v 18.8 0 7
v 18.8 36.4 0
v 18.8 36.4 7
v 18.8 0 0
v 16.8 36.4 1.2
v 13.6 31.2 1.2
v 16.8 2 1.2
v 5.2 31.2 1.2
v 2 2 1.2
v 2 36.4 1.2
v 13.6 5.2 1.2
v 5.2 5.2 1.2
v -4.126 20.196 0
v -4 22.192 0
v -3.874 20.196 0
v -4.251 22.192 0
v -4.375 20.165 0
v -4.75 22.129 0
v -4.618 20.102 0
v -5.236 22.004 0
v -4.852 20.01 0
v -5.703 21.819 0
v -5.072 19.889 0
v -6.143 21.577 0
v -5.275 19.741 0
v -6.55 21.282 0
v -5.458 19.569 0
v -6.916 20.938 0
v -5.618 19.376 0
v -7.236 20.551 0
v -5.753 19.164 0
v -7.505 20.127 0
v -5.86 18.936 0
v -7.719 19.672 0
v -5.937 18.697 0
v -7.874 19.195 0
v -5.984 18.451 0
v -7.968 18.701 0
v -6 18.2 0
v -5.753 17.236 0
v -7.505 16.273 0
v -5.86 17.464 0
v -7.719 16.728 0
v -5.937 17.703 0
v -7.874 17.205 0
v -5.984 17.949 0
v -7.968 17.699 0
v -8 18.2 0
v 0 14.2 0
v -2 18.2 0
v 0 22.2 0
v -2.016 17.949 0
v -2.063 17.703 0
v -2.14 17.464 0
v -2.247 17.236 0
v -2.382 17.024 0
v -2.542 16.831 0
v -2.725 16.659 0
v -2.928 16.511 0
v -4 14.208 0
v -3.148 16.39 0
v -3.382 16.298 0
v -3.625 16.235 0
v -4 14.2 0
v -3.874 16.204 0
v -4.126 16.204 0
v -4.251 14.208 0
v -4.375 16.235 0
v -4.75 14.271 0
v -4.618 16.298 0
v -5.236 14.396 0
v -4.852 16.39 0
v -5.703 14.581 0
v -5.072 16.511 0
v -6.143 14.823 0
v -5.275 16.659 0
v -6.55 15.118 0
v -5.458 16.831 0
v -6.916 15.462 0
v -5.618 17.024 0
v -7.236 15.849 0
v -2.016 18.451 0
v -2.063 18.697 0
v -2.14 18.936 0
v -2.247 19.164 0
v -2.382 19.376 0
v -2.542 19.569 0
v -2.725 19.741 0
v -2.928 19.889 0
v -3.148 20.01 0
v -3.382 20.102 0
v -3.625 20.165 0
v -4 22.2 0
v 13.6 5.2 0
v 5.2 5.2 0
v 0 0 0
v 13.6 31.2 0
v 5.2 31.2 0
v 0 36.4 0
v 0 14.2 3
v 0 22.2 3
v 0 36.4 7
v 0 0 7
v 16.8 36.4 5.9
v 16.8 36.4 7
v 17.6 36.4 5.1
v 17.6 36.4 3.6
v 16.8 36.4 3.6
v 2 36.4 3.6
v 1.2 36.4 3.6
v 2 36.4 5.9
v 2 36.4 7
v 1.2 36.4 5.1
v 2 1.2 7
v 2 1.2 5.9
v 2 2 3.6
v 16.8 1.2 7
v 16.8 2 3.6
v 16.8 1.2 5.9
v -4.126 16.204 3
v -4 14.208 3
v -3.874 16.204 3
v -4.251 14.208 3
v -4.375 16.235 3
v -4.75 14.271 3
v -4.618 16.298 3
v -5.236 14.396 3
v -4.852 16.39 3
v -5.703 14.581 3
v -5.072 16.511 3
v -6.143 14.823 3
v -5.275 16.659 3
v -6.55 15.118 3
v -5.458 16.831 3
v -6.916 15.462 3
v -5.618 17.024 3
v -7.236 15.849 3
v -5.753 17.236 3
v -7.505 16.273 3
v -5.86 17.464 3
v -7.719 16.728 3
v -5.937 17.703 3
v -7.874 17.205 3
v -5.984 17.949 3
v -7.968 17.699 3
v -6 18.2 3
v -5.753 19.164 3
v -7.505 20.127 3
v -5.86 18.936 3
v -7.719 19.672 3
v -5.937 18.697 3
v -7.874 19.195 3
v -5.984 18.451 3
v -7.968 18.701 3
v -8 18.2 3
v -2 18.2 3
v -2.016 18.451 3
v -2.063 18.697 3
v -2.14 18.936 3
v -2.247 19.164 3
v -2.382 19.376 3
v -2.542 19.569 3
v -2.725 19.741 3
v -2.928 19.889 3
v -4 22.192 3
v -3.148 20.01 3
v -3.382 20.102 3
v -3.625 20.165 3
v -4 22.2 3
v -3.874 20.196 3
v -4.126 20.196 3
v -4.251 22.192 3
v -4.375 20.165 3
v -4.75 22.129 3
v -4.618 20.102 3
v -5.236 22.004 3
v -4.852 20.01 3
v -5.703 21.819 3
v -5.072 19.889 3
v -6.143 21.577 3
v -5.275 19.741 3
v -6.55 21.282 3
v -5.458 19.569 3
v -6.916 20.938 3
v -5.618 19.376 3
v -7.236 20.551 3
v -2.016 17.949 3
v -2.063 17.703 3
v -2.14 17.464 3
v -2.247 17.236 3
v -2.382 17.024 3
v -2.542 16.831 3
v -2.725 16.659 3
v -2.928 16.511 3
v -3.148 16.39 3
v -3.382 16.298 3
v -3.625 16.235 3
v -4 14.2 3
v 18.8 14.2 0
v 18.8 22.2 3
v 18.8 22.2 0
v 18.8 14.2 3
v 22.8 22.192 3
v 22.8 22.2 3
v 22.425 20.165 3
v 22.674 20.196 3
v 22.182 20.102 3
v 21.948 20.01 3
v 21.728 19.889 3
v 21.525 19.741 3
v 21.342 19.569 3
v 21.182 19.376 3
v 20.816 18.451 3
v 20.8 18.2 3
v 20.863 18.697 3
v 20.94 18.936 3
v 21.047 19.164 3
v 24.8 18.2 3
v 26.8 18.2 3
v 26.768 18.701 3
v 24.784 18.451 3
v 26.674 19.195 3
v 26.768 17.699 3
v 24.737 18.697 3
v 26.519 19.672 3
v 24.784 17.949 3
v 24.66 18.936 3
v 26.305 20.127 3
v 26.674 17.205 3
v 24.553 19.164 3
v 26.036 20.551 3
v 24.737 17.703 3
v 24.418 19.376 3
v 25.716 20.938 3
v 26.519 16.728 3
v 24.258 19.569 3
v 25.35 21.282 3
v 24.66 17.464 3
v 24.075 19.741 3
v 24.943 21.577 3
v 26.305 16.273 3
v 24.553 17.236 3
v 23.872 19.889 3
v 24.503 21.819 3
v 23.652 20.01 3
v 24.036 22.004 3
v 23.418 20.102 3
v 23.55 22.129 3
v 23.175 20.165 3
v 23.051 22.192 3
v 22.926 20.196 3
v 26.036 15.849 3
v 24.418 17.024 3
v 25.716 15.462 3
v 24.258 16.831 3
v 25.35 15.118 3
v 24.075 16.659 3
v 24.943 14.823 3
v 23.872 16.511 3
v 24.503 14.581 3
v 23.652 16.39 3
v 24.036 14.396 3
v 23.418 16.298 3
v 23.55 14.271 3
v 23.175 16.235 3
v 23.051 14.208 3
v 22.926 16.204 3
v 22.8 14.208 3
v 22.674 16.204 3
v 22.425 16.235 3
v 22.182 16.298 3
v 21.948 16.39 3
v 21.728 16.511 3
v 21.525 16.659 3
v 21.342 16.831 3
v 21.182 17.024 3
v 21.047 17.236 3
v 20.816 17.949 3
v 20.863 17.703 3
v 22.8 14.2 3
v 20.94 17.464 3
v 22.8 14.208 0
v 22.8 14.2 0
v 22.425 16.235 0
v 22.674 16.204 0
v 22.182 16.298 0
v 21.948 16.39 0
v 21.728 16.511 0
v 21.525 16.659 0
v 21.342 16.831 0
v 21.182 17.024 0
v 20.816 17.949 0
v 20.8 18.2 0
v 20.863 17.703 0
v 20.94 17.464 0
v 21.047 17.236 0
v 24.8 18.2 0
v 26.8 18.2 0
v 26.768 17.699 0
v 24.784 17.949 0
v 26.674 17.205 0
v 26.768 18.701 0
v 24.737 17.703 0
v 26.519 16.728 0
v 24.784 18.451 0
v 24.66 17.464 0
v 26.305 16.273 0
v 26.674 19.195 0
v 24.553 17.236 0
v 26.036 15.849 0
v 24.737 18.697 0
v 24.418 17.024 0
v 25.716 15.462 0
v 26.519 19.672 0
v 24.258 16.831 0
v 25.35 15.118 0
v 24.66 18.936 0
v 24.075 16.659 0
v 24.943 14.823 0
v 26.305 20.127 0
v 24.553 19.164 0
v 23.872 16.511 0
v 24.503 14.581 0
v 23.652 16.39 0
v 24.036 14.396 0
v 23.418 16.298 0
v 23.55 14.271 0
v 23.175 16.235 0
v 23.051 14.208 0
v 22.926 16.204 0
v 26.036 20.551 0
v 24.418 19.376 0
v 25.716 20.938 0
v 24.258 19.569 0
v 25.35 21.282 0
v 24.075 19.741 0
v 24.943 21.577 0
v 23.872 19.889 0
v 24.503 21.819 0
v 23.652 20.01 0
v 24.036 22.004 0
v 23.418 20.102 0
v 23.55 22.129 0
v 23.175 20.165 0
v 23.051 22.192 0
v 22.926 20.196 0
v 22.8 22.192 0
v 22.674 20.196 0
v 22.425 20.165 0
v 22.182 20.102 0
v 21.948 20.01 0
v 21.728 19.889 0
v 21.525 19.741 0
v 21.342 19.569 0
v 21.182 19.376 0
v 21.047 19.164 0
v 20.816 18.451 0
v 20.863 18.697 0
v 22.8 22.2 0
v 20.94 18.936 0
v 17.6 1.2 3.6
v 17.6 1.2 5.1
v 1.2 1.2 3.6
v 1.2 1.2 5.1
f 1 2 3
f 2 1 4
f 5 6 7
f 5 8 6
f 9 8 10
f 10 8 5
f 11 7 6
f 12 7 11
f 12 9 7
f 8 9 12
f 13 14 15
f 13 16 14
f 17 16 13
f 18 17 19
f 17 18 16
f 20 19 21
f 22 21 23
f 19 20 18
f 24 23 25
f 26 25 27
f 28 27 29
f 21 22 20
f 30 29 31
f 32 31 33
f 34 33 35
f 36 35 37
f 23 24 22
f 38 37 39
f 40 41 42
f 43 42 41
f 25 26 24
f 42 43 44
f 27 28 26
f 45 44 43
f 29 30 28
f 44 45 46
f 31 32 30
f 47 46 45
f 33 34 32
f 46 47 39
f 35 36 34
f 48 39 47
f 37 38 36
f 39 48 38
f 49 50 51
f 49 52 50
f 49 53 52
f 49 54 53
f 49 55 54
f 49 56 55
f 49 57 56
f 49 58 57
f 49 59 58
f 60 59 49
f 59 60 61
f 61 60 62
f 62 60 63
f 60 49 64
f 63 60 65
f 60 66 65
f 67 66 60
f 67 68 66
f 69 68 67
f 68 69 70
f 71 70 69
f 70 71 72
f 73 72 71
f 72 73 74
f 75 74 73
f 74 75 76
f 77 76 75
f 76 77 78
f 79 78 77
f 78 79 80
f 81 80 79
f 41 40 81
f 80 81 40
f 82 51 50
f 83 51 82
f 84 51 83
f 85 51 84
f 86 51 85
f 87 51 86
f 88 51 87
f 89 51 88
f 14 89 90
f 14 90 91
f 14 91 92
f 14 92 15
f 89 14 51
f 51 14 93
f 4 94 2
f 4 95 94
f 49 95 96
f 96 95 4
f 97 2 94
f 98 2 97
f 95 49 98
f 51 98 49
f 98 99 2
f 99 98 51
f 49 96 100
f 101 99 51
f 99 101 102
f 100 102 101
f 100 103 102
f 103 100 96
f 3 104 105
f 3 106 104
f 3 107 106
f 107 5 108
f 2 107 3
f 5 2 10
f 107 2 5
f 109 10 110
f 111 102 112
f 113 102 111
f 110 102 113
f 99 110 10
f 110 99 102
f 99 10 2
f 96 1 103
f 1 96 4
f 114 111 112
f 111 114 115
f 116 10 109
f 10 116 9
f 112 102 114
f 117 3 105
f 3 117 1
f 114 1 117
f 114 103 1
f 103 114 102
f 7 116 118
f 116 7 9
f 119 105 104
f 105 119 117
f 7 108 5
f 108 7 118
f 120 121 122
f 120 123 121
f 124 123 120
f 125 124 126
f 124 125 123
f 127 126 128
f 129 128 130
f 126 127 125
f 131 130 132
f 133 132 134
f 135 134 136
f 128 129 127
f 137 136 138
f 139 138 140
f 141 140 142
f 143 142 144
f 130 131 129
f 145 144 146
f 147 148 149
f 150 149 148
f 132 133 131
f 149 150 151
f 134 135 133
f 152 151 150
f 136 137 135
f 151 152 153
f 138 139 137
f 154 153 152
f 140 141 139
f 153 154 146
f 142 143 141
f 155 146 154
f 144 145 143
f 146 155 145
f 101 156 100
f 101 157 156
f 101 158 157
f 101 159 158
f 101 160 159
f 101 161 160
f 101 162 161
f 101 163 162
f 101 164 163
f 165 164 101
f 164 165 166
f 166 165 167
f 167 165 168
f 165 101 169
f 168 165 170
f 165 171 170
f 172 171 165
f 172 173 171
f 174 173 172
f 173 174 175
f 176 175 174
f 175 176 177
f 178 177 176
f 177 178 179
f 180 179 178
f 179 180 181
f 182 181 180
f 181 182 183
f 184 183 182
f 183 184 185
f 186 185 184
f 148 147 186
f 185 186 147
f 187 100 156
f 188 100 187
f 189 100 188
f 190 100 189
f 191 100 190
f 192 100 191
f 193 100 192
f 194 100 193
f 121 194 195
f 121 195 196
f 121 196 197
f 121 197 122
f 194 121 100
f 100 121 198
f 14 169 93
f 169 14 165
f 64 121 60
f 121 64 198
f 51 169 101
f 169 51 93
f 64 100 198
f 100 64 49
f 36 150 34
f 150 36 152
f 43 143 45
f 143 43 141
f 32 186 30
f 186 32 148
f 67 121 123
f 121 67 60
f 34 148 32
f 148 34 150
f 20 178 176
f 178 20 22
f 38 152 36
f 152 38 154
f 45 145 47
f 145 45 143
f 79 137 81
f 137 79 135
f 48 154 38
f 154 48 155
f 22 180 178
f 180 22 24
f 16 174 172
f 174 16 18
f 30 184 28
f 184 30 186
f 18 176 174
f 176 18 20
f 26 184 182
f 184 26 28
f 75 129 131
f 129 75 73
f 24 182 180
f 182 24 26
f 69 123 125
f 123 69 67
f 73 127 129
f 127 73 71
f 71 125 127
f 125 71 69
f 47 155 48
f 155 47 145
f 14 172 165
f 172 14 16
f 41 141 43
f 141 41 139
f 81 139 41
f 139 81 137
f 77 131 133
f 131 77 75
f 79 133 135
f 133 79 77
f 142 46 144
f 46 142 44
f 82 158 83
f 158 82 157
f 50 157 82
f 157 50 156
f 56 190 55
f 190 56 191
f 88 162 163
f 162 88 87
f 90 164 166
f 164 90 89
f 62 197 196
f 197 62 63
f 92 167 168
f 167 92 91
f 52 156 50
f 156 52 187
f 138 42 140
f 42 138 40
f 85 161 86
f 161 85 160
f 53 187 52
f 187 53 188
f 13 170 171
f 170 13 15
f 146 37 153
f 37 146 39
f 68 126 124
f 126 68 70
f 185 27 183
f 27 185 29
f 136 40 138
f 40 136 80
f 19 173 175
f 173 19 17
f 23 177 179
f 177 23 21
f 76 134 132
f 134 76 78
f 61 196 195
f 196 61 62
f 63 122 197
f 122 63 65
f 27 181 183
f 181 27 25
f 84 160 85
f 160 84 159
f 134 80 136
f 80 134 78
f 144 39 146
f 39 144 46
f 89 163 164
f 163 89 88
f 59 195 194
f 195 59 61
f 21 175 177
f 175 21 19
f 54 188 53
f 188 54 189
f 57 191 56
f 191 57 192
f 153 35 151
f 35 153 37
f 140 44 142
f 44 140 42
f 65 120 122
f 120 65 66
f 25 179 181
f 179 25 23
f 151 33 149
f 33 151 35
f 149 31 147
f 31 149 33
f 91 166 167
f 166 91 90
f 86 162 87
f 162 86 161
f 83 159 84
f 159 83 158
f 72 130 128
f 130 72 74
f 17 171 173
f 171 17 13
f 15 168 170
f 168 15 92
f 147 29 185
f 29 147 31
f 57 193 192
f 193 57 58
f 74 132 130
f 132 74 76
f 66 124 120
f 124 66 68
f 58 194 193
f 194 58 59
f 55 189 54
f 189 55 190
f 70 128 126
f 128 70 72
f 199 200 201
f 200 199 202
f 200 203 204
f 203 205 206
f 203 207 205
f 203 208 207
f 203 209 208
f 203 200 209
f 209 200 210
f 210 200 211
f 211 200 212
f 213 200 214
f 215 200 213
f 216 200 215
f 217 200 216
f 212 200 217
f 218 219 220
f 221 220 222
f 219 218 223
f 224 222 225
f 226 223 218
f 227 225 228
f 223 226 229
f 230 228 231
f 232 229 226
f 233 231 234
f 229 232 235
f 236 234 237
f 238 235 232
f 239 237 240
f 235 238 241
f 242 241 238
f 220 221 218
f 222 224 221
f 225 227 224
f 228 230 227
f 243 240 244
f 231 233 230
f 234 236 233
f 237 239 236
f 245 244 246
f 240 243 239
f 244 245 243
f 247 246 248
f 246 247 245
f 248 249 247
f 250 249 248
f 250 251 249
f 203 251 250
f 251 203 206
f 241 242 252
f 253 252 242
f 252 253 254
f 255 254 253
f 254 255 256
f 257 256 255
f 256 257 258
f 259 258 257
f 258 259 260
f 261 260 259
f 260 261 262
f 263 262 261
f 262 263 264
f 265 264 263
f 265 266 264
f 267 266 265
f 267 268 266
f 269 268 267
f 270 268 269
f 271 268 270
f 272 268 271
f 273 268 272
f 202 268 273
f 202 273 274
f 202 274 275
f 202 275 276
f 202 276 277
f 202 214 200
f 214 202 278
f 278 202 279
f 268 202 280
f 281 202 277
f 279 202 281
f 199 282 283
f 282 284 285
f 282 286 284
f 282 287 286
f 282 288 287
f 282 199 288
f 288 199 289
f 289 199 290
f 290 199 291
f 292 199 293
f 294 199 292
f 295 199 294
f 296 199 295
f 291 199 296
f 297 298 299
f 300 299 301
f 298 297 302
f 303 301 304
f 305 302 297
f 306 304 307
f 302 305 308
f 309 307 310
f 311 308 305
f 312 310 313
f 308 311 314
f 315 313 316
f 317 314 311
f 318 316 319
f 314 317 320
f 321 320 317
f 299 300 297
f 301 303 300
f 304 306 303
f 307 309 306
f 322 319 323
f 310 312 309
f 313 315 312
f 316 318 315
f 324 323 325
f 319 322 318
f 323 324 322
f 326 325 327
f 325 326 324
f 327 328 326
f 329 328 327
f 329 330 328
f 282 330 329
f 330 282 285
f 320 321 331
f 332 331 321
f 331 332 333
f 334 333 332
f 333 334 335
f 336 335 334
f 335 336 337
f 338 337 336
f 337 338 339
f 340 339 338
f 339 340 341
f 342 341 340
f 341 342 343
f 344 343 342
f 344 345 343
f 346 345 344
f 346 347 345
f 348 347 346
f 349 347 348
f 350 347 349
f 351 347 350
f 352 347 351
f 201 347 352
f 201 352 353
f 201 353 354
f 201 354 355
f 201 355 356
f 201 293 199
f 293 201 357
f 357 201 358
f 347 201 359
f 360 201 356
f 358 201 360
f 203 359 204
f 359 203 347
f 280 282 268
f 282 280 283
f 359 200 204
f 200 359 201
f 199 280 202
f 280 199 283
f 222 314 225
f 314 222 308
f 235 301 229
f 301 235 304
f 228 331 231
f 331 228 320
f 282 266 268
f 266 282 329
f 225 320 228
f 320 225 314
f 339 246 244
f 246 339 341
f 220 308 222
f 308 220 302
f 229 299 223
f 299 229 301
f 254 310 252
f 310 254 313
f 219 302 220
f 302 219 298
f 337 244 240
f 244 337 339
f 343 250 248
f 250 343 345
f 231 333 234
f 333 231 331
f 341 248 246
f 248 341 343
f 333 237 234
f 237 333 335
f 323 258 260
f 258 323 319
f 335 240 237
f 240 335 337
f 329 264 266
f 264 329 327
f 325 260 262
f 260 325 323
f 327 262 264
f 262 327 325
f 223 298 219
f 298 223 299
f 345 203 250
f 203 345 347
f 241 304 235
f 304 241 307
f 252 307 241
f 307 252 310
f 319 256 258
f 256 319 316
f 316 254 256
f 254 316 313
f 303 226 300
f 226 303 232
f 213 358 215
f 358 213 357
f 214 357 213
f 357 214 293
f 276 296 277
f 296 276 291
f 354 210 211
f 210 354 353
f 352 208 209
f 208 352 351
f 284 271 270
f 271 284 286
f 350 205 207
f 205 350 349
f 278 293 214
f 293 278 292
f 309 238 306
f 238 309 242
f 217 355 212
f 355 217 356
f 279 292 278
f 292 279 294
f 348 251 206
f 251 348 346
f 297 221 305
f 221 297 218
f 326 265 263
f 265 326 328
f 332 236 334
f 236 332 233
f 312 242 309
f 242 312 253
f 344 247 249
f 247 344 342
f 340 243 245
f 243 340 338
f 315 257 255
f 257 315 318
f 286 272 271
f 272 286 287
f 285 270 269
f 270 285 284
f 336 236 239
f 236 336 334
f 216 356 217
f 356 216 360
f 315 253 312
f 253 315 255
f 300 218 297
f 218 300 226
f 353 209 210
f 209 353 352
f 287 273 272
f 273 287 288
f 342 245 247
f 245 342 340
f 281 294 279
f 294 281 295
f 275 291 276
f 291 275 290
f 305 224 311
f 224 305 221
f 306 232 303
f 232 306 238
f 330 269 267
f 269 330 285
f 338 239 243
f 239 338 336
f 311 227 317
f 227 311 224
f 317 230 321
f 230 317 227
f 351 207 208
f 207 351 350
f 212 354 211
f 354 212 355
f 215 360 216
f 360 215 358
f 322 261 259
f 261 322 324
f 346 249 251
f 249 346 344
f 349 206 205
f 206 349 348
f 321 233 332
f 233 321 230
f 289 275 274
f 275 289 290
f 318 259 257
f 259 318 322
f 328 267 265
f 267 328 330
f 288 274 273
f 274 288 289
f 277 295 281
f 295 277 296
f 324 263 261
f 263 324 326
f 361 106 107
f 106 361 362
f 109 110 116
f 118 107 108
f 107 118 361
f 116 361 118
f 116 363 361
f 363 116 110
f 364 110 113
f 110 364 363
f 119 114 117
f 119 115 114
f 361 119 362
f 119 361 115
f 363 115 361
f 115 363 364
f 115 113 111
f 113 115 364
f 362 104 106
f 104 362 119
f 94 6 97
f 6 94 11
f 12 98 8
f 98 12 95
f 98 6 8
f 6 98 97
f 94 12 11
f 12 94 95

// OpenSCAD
// file: ../lib/pcb_led_cvf.scad
// for led power module modified

/* bluetooth_mate_holder.scad
 * By John Biehler - November 17, 2011
 * http://www.thingiverse.com/thing:

 * derived from pcb_box_slide_with_tabs.scad
 * By Nicholas C Lewis - Jan 1, 2011
 * http://www.thingiverse.com/thing:5396
 *
 * derived from pcb_box_slide.scad
 *     Parametric, open PCB-box (slide-in) by chlunde
 *     http://www.thingiverse.com/thing:4071
 *
 * CHANGES
 * - adjusted to fit Arduino Mega
 * - added mounting tabs
 * - turned off cutouts
 * - adjusted bottom cutout size
 */

$fn=50;

module pcb_led_cvf(

	pcb_width = 48.2,
	pcb_length =24.1,
	pcb_height =1.1,
	slisse = 0.8,

	pcb_bottom_margin = 1,
	wall_width_thick = 2,
	box_height = 7,

	//tab parameters
	tab_hole_radius=2,
	tab_outer_radius=4,

	inner_margin = 4,

	add_tabs = true

) {
	wall_width = wall_width_thick-slisse;

module tab() {
	difference(){
		union() {
			translate([-tab_outer_radius,-tab_outer_radius,0])
			cube([tab_outer_radius,2*tab_outer_radius,wall_width_thick+1]);
			translate([-tab_outer_radius,0,0])
				cylinder(r=tab_outer_radius, h = wall_width_thick+1);
		}
		translate([-tab_outer_radius,0,0]) {
			cylinder(r= tab_hole_radius, h = wall_width_thick+5,center=true);
		}
	}

}

module box() {
	union() {
		cube([pcb_width + 2*wall_width, pcb_length + 2*wall_width, wall_width]);

		cube([wall_width_thick, pcb_length + 2*wall_width, box_height]);

		cube([pcb_width + 2*wall_width, wall_width_thick, box_height]);

		%translate([0, pcb_length+wall_width, 0])
			cube([pcb_width + 2*wall_width,wall_width,box_height]);

		translate([pcb_width + wall_width - slisse,0,0])
			cube([wall_width_thick, pcb_length + 2*wall_width, box_height]);
	}
	if(add_tabs) {
//comment out this part to remove tabs
		for(i=[(pcb_length + 2*wall_width)/2]){
	translate([0,i,0])tab();
	translate([pcb_width + 2*wall_width,i,0])mirror()tab();
		}
	}

}

module pcb() {
	translate([wall_width, wall_width, wall_width + pcb_bottom_margin])
		cube([pcb_width,pcb_length + wall_width + 0.1,pcb_height]);
	translate([wall_width, wall_width, wall_width + pcb_bottom_margin+pcb_height])rotate([0,45,0])
		cube([pcb_height,pcb_length + wall_width + 0.1,pcb_height]);
	translate([wall_width+pcb_width-2*cos(45)*pcb_height, wall_width, wall_width + pcb_bottom_margin+pcb_height])rotate([0,45,0])
		cube([pcb_height,pcb_length + wall_width + 0.1,pcb_height]);
	translate([wall_width_thick, wall_width, wall_width + pcb_bottom_margin])
		cube([pcb_width-2*slisse,pcb_length + wall_width + 0.1,box_height]);

}



module holes() {
		*translate([wall_width + pcb_width/2, wall_width_thick + 0.1, pcb_width/2+wall_width])
			rotate(a=90,v=[1,0,0])
				cylinder(r=pcb_width/2, h=wall_width_thick + 0.2);

		*translate([-0.1, wall_width + pcb_length/2, pcb_length/2 + wall_width])
			rotate(a=90,v=[0,1,0])
				cylinder(r=pcb_length/2, h=wall_width_thick + 0.2);

		*translate([pcb_width + wall_width - slisse - 0.1, wall_width + pcb_length/2, pcb_length/2 + wall_width])
			rotate(a=90,v=[0,1,0])
				cylinder(r=pcb_length/2, h=wall_width_thick + 0.2);

	 * translate([pcb_width/2 + wall_width, wall_width + pcb_length/2, -0.1])
			rotate(a=0,v=[0,1,0])
				cylinder(r=min(pcb_length,pcb_width)/2 - wall_width/2, h=wall_width_thick + 0.2);

		translate([inner_margin +wall_width, inner_margin+wall_width, -0.1])
			cube([pcb_width-inner_margin*2,pcb_length -inner_margin*2,wall_width + 0.2]);
}

	difference() {
		box();
		pcb();
		holes();
	}
}



pcb_led_cvf();
// main file
use <../lib/pcb_led_cvf.scad>


pcb_led_cvf(
  pcb_length=34,
  pcb_width=16.4,
  pcb_height=1.5,
  pcb_bottom_margin=2.4
);
